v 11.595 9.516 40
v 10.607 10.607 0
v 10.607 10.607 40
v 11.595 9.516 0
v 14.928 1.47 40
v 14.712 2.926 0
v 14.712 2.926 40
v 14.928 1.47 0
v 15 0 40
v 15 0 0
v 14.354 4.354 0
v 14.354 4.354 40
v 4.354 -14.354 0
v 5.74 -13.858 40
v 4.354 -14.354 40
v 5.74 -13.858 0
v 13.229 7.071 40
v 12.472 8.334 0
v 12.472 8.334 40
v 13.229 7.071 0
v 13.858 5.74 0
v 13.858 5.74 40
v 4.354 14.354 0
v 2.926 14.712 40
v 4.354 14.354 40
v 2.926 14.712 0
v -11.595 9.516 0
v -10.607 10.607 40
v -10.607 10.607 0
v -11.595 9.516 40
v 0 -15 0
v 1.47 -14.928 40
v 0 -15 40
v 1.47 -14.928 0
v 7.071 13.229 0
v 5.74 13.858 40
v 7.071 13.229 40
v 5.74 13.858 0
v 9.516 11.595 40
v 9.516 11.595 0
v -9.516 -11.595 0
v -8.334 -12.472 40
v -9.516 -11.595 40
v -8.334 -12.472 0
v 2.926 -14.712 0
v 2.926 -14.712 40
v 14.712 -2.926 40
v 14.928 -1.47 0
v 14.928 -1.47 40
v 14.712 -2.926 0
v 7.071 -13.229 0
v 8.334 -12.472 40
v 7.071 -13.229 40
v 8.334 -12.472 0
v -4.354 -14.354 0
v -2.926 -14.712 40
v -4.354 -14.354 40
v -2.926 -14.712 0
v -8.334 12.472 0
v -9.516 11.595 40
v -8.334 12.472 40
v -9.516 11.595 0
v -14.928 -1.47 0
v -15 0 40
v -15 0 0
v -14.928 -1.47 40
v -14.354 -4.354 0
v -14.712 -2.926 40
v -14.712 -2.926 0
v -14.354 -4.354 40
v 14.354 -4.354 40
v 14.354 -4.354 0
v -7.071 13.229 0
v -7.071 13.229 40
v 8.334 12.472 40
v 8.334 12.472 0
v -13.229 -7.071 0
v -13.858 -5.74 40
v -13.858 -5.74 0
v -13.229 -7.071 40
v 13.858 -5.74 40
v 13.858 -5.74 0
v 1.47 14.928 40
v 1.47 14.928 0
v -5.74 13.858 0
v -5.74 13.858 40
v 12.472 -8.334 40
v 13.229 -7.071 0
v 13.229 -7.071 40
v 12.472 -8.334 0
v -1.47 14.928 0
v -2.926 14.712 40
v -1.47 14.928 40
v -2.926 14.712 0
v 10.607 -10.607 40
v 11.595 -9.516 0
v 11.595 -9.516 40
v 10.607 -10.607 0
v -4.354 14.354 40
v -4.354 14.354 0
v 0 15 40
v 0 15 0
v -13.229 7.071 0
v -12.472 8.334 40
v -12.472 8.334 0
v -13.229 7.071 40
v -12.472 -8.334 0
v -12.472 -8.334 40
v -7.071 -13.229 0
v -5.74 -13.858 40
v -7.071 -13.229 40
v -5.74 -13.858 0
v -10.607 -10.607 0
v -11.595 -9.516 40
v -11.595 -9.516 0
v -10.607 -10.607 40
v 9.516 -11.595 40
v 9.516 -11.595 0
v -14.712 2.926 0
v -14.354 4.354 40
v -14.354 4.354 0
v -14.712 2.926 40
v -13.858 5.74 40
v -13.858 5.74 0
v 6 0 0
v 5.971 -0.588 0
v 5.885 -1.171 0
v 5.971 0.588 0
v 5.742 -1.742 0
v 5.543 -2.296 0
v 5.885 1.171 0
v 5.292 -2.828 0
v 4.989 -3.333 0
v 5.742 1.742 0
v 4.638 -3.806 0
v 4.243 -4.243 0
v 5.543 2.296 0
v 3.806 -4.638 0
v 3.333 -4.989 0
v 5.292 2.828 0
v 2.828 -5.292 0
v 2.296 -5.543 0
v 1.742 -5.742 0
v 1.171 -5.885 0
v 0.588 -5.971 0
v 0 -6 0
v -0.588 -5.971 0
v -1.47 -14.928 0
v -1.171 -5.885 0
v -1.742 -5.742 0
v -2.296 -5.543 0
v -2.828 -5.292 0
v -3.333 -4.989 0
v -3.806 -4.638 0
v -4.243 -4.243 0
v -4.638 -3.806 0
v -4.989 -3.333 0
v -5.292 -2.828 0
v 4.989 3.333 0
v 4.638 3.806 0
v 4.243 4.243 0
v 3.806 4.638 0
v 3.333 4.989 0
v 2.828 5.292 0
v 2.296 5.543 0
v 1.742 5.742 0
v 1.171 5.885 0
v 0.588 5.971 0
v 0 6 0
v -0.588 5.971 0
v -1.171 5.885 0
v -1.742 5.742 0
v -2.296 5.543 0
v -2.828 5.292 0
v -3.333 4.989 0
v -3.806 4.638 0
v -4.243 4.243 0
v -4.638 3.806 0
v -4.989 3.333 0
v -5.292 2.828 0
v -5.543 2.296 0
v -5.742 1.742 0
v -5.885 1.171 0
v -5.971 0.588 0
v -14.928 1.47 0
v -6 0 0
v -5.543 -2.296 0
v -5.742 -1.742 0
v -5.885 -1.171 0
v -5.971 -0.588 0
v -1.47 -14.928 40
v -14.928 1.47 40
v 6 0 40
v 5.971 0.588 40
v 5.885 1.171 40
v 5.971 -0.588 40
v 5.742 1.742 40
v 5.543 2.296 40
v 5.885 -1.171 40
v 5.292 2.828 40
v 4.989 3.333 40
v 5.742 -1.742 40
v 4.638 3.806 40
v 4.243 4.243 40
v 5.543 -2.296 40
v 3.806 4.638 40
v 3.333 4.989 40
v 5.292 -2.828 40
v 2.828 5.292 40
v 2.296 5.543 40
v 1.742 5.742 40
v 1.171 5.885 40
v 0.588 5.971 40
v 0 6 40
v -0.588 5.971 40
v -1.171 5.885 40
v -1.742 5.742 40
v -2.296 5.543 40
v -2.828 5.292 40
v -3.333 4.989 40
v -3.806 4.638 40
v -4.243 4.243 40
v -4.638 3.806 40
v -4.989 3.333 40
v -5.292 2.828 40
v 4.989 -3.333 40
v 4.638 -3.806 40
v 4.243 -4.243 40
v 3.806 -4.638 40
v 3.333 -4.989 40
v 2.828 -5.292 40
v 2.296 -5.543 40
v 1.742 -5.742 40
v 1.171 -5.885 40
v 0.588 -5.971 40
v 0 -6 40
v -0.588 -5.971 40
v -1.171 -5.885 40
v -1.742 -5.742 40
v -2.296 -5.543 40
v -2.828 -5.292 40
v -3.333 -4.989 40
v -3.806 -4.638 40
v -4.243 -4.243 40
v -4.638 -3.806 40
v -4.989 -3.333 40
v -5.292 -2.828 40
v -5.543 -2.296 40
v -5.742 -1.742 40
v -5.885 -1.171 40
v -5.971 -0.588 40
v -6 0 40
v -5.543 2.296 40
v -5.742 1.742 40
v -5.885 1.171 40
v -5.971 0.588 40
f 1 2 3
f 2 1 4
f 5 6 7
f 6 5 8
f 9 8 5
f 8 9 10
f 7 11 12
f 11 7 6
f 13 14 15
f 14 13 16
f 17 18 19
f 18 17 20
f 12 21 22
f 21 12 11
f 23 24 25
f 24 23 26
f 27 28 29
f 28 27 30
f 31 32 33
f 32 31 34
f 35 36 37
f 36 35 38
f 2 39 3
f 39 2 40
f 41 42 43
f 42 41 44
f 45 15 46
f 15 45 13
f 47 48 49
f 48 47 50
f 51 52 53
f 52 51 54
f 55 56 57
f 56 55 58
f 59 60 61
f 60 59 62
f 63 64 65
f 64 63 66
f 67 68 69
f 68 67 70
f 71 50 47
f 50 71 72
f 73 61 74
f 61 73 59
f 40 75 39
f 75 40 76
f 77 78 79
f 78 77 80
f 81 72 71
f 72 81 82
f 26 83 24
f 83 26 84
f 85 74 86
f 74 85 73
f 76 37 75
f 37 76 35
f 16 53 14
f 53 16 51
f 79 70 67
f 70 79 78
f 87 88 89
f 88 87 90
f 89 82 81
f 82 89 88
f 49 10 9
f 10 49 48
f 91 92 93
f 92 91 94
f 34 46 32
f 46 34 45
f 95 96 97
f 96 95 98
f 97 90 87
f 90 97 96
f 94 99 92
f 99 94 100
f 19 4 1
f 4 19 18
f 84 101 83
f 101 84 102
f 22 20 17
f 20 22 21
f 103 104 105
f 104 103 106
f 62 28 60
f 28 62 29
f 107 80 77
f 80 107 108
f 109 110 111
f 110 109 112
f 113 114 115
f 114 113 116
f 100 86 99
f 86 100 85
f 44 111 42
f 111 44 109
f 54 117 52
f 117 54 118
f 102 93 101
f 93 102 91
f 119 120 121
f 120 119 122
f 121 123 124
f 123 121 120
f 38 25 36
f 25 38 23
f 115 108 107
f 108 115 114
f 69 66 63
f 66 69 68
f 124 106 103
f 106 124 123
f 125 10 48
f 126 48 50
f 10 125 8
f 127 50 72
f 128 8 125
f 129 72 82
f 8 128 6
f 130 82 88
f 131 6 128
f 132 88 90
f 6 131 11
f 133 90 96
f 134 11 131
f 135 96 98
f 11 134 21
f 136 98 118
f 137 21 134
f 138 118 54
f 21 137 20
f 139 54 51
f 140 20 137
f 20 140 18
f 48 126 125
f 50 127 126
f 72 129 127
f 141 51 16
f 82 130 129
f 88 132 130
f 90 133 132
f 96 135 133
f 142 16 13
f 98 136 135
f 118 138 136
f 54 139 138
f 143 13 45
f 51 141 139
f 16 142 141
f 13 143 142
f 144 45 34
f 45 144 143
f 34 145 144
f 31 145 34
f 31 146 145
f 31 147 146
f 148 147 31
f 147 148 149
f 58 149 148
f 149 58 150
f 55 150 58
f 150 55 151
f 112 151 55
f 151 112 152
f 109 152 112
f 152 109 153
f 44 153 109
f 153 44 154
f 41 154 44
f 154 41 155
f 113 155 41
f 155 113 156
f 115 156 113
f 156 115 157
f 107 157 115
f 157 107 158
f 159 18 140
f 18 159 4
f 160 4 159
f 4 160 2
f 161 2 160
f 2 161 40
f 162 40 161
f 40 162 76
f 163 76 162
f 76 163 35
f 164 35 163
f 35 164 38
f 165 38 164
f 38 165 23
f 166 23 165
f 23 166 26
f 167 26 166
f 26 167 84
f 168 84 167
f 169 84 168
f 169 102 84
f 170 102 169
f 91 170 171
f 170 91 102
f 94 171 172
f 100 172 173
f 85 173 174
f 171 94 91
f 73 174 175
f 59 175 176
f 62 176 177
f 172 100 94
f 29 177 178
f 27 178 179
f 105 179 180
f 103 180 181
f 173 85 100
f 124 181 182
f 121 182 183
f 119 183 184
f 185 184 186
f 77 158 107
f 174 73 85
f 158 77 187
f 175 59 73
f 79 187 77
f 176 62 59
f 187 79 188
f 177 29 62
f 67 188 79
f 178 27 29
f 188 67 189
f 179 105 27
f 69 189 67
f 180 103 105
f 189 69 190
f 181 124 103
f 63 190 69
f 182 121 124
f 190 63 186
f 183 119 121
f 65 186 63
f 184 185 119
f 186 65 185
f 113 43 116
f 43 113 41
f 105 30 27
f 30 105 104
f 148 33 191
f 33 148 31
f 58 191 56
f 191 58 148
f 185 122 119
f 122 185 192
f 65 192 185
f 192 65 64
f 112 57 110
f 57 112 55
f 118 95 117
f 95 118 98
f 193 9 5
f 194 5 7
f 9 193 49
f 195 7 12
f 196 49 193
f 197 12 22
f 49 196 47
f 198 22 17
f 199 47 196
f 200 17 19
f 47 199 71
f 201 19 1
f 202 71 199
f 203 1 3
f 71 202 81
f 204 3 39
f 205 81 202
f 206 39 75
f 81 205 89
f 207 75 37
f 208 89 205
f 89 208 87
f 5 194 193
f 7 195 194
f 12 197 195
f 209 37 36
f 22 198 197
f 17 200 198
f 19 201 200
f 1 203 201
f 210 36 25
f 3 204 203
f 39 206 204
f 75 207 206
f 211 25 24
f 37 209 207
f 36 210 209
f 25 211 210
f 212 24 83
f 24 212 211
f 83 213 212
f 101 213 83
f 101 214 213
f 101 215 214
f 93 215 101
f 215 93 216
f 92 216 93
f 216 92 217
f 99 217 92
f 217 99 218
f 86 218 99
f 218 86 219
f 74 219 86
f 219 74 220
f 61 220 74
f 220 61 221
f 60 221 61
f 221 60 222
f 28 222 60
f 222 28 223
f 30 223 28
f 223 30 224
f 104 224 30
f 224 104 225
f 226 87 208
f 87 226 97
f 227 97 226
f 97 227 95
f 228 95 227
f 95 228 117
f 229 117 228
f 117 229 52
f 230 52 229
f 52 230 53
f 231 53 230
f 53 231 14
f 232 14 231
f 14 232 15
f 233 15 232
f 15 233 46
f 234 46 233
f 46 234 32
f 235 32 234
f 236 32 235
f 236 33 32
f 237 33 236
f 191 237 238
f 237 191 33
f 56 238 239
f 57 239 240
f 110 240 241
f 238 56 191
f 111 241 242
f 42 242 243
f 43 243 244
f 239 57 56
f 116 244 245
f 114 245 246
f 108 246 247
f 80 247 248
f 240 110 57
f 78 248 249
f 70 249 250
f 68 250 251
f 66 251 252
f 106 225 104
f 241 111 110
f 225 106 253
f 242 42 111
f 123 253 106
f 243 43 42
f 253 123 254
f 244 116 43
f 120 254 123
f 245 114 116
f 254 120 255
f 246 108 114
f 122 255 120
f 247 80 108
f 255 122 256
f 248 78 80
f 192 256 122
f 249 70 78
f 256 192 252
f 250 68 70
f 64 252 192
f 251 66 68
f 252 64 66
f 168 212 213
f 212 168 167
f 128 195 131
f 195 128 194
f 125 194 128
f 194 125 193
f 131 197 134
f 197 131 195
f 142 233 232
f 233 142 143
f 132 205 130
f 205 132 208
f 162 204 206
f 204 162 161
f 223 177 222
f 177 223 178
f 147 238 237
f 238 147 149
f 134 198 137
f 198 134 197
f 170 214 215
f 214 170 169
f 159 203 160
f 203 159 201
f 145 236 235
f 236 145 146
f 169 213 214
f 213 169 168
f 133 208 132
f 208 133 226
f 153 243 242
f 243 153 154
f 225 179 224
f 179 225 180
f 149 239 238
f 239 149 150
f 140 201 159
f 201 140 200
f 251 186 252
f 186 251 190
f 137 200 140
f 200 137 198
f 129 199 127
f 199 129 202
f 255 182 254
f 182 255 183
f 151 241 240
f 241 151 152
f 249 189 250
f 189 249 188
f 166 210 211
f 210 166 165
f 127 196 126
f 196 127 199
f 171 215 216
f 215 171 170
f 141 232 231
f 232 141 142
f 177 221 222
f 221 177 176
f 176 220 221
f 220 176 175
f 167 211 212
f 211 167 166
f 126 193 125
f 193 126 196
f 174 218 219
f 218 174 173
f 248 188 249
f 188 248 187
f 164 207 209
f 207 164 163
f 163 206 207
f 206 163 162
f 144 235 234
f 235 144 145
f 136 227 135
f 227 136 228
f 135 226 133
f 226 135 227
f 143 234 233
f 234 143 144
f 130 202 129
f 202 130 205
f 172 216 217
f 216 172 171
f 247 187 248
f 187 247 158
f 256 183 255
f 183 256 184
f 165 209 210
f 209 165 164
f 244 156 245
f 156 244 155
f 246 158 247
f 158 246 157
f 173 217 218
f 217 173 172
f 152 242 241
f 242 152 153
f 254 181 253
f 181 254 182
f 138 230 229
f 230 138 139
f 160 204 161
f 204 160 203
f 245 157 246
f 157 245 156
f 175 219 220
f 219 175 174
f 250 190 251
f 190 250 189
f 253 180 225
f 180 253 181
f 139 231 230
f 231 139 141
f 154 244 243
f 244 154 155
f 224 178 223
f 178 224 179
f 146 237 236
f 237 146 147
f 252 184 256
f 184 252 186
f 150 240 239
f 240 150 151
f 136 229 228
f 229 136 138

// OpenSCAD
// Starter file for task-005.
// Edit this file in OpenSCAD to complete the requested hard task.
$fn = 64;

module vertical_pipe() {
    difference() {
        cylinder(d=30, h=40);
        translate([0,0,-1]) cylinder(d=12, h=42);
    }
}

vertical_pipe();
